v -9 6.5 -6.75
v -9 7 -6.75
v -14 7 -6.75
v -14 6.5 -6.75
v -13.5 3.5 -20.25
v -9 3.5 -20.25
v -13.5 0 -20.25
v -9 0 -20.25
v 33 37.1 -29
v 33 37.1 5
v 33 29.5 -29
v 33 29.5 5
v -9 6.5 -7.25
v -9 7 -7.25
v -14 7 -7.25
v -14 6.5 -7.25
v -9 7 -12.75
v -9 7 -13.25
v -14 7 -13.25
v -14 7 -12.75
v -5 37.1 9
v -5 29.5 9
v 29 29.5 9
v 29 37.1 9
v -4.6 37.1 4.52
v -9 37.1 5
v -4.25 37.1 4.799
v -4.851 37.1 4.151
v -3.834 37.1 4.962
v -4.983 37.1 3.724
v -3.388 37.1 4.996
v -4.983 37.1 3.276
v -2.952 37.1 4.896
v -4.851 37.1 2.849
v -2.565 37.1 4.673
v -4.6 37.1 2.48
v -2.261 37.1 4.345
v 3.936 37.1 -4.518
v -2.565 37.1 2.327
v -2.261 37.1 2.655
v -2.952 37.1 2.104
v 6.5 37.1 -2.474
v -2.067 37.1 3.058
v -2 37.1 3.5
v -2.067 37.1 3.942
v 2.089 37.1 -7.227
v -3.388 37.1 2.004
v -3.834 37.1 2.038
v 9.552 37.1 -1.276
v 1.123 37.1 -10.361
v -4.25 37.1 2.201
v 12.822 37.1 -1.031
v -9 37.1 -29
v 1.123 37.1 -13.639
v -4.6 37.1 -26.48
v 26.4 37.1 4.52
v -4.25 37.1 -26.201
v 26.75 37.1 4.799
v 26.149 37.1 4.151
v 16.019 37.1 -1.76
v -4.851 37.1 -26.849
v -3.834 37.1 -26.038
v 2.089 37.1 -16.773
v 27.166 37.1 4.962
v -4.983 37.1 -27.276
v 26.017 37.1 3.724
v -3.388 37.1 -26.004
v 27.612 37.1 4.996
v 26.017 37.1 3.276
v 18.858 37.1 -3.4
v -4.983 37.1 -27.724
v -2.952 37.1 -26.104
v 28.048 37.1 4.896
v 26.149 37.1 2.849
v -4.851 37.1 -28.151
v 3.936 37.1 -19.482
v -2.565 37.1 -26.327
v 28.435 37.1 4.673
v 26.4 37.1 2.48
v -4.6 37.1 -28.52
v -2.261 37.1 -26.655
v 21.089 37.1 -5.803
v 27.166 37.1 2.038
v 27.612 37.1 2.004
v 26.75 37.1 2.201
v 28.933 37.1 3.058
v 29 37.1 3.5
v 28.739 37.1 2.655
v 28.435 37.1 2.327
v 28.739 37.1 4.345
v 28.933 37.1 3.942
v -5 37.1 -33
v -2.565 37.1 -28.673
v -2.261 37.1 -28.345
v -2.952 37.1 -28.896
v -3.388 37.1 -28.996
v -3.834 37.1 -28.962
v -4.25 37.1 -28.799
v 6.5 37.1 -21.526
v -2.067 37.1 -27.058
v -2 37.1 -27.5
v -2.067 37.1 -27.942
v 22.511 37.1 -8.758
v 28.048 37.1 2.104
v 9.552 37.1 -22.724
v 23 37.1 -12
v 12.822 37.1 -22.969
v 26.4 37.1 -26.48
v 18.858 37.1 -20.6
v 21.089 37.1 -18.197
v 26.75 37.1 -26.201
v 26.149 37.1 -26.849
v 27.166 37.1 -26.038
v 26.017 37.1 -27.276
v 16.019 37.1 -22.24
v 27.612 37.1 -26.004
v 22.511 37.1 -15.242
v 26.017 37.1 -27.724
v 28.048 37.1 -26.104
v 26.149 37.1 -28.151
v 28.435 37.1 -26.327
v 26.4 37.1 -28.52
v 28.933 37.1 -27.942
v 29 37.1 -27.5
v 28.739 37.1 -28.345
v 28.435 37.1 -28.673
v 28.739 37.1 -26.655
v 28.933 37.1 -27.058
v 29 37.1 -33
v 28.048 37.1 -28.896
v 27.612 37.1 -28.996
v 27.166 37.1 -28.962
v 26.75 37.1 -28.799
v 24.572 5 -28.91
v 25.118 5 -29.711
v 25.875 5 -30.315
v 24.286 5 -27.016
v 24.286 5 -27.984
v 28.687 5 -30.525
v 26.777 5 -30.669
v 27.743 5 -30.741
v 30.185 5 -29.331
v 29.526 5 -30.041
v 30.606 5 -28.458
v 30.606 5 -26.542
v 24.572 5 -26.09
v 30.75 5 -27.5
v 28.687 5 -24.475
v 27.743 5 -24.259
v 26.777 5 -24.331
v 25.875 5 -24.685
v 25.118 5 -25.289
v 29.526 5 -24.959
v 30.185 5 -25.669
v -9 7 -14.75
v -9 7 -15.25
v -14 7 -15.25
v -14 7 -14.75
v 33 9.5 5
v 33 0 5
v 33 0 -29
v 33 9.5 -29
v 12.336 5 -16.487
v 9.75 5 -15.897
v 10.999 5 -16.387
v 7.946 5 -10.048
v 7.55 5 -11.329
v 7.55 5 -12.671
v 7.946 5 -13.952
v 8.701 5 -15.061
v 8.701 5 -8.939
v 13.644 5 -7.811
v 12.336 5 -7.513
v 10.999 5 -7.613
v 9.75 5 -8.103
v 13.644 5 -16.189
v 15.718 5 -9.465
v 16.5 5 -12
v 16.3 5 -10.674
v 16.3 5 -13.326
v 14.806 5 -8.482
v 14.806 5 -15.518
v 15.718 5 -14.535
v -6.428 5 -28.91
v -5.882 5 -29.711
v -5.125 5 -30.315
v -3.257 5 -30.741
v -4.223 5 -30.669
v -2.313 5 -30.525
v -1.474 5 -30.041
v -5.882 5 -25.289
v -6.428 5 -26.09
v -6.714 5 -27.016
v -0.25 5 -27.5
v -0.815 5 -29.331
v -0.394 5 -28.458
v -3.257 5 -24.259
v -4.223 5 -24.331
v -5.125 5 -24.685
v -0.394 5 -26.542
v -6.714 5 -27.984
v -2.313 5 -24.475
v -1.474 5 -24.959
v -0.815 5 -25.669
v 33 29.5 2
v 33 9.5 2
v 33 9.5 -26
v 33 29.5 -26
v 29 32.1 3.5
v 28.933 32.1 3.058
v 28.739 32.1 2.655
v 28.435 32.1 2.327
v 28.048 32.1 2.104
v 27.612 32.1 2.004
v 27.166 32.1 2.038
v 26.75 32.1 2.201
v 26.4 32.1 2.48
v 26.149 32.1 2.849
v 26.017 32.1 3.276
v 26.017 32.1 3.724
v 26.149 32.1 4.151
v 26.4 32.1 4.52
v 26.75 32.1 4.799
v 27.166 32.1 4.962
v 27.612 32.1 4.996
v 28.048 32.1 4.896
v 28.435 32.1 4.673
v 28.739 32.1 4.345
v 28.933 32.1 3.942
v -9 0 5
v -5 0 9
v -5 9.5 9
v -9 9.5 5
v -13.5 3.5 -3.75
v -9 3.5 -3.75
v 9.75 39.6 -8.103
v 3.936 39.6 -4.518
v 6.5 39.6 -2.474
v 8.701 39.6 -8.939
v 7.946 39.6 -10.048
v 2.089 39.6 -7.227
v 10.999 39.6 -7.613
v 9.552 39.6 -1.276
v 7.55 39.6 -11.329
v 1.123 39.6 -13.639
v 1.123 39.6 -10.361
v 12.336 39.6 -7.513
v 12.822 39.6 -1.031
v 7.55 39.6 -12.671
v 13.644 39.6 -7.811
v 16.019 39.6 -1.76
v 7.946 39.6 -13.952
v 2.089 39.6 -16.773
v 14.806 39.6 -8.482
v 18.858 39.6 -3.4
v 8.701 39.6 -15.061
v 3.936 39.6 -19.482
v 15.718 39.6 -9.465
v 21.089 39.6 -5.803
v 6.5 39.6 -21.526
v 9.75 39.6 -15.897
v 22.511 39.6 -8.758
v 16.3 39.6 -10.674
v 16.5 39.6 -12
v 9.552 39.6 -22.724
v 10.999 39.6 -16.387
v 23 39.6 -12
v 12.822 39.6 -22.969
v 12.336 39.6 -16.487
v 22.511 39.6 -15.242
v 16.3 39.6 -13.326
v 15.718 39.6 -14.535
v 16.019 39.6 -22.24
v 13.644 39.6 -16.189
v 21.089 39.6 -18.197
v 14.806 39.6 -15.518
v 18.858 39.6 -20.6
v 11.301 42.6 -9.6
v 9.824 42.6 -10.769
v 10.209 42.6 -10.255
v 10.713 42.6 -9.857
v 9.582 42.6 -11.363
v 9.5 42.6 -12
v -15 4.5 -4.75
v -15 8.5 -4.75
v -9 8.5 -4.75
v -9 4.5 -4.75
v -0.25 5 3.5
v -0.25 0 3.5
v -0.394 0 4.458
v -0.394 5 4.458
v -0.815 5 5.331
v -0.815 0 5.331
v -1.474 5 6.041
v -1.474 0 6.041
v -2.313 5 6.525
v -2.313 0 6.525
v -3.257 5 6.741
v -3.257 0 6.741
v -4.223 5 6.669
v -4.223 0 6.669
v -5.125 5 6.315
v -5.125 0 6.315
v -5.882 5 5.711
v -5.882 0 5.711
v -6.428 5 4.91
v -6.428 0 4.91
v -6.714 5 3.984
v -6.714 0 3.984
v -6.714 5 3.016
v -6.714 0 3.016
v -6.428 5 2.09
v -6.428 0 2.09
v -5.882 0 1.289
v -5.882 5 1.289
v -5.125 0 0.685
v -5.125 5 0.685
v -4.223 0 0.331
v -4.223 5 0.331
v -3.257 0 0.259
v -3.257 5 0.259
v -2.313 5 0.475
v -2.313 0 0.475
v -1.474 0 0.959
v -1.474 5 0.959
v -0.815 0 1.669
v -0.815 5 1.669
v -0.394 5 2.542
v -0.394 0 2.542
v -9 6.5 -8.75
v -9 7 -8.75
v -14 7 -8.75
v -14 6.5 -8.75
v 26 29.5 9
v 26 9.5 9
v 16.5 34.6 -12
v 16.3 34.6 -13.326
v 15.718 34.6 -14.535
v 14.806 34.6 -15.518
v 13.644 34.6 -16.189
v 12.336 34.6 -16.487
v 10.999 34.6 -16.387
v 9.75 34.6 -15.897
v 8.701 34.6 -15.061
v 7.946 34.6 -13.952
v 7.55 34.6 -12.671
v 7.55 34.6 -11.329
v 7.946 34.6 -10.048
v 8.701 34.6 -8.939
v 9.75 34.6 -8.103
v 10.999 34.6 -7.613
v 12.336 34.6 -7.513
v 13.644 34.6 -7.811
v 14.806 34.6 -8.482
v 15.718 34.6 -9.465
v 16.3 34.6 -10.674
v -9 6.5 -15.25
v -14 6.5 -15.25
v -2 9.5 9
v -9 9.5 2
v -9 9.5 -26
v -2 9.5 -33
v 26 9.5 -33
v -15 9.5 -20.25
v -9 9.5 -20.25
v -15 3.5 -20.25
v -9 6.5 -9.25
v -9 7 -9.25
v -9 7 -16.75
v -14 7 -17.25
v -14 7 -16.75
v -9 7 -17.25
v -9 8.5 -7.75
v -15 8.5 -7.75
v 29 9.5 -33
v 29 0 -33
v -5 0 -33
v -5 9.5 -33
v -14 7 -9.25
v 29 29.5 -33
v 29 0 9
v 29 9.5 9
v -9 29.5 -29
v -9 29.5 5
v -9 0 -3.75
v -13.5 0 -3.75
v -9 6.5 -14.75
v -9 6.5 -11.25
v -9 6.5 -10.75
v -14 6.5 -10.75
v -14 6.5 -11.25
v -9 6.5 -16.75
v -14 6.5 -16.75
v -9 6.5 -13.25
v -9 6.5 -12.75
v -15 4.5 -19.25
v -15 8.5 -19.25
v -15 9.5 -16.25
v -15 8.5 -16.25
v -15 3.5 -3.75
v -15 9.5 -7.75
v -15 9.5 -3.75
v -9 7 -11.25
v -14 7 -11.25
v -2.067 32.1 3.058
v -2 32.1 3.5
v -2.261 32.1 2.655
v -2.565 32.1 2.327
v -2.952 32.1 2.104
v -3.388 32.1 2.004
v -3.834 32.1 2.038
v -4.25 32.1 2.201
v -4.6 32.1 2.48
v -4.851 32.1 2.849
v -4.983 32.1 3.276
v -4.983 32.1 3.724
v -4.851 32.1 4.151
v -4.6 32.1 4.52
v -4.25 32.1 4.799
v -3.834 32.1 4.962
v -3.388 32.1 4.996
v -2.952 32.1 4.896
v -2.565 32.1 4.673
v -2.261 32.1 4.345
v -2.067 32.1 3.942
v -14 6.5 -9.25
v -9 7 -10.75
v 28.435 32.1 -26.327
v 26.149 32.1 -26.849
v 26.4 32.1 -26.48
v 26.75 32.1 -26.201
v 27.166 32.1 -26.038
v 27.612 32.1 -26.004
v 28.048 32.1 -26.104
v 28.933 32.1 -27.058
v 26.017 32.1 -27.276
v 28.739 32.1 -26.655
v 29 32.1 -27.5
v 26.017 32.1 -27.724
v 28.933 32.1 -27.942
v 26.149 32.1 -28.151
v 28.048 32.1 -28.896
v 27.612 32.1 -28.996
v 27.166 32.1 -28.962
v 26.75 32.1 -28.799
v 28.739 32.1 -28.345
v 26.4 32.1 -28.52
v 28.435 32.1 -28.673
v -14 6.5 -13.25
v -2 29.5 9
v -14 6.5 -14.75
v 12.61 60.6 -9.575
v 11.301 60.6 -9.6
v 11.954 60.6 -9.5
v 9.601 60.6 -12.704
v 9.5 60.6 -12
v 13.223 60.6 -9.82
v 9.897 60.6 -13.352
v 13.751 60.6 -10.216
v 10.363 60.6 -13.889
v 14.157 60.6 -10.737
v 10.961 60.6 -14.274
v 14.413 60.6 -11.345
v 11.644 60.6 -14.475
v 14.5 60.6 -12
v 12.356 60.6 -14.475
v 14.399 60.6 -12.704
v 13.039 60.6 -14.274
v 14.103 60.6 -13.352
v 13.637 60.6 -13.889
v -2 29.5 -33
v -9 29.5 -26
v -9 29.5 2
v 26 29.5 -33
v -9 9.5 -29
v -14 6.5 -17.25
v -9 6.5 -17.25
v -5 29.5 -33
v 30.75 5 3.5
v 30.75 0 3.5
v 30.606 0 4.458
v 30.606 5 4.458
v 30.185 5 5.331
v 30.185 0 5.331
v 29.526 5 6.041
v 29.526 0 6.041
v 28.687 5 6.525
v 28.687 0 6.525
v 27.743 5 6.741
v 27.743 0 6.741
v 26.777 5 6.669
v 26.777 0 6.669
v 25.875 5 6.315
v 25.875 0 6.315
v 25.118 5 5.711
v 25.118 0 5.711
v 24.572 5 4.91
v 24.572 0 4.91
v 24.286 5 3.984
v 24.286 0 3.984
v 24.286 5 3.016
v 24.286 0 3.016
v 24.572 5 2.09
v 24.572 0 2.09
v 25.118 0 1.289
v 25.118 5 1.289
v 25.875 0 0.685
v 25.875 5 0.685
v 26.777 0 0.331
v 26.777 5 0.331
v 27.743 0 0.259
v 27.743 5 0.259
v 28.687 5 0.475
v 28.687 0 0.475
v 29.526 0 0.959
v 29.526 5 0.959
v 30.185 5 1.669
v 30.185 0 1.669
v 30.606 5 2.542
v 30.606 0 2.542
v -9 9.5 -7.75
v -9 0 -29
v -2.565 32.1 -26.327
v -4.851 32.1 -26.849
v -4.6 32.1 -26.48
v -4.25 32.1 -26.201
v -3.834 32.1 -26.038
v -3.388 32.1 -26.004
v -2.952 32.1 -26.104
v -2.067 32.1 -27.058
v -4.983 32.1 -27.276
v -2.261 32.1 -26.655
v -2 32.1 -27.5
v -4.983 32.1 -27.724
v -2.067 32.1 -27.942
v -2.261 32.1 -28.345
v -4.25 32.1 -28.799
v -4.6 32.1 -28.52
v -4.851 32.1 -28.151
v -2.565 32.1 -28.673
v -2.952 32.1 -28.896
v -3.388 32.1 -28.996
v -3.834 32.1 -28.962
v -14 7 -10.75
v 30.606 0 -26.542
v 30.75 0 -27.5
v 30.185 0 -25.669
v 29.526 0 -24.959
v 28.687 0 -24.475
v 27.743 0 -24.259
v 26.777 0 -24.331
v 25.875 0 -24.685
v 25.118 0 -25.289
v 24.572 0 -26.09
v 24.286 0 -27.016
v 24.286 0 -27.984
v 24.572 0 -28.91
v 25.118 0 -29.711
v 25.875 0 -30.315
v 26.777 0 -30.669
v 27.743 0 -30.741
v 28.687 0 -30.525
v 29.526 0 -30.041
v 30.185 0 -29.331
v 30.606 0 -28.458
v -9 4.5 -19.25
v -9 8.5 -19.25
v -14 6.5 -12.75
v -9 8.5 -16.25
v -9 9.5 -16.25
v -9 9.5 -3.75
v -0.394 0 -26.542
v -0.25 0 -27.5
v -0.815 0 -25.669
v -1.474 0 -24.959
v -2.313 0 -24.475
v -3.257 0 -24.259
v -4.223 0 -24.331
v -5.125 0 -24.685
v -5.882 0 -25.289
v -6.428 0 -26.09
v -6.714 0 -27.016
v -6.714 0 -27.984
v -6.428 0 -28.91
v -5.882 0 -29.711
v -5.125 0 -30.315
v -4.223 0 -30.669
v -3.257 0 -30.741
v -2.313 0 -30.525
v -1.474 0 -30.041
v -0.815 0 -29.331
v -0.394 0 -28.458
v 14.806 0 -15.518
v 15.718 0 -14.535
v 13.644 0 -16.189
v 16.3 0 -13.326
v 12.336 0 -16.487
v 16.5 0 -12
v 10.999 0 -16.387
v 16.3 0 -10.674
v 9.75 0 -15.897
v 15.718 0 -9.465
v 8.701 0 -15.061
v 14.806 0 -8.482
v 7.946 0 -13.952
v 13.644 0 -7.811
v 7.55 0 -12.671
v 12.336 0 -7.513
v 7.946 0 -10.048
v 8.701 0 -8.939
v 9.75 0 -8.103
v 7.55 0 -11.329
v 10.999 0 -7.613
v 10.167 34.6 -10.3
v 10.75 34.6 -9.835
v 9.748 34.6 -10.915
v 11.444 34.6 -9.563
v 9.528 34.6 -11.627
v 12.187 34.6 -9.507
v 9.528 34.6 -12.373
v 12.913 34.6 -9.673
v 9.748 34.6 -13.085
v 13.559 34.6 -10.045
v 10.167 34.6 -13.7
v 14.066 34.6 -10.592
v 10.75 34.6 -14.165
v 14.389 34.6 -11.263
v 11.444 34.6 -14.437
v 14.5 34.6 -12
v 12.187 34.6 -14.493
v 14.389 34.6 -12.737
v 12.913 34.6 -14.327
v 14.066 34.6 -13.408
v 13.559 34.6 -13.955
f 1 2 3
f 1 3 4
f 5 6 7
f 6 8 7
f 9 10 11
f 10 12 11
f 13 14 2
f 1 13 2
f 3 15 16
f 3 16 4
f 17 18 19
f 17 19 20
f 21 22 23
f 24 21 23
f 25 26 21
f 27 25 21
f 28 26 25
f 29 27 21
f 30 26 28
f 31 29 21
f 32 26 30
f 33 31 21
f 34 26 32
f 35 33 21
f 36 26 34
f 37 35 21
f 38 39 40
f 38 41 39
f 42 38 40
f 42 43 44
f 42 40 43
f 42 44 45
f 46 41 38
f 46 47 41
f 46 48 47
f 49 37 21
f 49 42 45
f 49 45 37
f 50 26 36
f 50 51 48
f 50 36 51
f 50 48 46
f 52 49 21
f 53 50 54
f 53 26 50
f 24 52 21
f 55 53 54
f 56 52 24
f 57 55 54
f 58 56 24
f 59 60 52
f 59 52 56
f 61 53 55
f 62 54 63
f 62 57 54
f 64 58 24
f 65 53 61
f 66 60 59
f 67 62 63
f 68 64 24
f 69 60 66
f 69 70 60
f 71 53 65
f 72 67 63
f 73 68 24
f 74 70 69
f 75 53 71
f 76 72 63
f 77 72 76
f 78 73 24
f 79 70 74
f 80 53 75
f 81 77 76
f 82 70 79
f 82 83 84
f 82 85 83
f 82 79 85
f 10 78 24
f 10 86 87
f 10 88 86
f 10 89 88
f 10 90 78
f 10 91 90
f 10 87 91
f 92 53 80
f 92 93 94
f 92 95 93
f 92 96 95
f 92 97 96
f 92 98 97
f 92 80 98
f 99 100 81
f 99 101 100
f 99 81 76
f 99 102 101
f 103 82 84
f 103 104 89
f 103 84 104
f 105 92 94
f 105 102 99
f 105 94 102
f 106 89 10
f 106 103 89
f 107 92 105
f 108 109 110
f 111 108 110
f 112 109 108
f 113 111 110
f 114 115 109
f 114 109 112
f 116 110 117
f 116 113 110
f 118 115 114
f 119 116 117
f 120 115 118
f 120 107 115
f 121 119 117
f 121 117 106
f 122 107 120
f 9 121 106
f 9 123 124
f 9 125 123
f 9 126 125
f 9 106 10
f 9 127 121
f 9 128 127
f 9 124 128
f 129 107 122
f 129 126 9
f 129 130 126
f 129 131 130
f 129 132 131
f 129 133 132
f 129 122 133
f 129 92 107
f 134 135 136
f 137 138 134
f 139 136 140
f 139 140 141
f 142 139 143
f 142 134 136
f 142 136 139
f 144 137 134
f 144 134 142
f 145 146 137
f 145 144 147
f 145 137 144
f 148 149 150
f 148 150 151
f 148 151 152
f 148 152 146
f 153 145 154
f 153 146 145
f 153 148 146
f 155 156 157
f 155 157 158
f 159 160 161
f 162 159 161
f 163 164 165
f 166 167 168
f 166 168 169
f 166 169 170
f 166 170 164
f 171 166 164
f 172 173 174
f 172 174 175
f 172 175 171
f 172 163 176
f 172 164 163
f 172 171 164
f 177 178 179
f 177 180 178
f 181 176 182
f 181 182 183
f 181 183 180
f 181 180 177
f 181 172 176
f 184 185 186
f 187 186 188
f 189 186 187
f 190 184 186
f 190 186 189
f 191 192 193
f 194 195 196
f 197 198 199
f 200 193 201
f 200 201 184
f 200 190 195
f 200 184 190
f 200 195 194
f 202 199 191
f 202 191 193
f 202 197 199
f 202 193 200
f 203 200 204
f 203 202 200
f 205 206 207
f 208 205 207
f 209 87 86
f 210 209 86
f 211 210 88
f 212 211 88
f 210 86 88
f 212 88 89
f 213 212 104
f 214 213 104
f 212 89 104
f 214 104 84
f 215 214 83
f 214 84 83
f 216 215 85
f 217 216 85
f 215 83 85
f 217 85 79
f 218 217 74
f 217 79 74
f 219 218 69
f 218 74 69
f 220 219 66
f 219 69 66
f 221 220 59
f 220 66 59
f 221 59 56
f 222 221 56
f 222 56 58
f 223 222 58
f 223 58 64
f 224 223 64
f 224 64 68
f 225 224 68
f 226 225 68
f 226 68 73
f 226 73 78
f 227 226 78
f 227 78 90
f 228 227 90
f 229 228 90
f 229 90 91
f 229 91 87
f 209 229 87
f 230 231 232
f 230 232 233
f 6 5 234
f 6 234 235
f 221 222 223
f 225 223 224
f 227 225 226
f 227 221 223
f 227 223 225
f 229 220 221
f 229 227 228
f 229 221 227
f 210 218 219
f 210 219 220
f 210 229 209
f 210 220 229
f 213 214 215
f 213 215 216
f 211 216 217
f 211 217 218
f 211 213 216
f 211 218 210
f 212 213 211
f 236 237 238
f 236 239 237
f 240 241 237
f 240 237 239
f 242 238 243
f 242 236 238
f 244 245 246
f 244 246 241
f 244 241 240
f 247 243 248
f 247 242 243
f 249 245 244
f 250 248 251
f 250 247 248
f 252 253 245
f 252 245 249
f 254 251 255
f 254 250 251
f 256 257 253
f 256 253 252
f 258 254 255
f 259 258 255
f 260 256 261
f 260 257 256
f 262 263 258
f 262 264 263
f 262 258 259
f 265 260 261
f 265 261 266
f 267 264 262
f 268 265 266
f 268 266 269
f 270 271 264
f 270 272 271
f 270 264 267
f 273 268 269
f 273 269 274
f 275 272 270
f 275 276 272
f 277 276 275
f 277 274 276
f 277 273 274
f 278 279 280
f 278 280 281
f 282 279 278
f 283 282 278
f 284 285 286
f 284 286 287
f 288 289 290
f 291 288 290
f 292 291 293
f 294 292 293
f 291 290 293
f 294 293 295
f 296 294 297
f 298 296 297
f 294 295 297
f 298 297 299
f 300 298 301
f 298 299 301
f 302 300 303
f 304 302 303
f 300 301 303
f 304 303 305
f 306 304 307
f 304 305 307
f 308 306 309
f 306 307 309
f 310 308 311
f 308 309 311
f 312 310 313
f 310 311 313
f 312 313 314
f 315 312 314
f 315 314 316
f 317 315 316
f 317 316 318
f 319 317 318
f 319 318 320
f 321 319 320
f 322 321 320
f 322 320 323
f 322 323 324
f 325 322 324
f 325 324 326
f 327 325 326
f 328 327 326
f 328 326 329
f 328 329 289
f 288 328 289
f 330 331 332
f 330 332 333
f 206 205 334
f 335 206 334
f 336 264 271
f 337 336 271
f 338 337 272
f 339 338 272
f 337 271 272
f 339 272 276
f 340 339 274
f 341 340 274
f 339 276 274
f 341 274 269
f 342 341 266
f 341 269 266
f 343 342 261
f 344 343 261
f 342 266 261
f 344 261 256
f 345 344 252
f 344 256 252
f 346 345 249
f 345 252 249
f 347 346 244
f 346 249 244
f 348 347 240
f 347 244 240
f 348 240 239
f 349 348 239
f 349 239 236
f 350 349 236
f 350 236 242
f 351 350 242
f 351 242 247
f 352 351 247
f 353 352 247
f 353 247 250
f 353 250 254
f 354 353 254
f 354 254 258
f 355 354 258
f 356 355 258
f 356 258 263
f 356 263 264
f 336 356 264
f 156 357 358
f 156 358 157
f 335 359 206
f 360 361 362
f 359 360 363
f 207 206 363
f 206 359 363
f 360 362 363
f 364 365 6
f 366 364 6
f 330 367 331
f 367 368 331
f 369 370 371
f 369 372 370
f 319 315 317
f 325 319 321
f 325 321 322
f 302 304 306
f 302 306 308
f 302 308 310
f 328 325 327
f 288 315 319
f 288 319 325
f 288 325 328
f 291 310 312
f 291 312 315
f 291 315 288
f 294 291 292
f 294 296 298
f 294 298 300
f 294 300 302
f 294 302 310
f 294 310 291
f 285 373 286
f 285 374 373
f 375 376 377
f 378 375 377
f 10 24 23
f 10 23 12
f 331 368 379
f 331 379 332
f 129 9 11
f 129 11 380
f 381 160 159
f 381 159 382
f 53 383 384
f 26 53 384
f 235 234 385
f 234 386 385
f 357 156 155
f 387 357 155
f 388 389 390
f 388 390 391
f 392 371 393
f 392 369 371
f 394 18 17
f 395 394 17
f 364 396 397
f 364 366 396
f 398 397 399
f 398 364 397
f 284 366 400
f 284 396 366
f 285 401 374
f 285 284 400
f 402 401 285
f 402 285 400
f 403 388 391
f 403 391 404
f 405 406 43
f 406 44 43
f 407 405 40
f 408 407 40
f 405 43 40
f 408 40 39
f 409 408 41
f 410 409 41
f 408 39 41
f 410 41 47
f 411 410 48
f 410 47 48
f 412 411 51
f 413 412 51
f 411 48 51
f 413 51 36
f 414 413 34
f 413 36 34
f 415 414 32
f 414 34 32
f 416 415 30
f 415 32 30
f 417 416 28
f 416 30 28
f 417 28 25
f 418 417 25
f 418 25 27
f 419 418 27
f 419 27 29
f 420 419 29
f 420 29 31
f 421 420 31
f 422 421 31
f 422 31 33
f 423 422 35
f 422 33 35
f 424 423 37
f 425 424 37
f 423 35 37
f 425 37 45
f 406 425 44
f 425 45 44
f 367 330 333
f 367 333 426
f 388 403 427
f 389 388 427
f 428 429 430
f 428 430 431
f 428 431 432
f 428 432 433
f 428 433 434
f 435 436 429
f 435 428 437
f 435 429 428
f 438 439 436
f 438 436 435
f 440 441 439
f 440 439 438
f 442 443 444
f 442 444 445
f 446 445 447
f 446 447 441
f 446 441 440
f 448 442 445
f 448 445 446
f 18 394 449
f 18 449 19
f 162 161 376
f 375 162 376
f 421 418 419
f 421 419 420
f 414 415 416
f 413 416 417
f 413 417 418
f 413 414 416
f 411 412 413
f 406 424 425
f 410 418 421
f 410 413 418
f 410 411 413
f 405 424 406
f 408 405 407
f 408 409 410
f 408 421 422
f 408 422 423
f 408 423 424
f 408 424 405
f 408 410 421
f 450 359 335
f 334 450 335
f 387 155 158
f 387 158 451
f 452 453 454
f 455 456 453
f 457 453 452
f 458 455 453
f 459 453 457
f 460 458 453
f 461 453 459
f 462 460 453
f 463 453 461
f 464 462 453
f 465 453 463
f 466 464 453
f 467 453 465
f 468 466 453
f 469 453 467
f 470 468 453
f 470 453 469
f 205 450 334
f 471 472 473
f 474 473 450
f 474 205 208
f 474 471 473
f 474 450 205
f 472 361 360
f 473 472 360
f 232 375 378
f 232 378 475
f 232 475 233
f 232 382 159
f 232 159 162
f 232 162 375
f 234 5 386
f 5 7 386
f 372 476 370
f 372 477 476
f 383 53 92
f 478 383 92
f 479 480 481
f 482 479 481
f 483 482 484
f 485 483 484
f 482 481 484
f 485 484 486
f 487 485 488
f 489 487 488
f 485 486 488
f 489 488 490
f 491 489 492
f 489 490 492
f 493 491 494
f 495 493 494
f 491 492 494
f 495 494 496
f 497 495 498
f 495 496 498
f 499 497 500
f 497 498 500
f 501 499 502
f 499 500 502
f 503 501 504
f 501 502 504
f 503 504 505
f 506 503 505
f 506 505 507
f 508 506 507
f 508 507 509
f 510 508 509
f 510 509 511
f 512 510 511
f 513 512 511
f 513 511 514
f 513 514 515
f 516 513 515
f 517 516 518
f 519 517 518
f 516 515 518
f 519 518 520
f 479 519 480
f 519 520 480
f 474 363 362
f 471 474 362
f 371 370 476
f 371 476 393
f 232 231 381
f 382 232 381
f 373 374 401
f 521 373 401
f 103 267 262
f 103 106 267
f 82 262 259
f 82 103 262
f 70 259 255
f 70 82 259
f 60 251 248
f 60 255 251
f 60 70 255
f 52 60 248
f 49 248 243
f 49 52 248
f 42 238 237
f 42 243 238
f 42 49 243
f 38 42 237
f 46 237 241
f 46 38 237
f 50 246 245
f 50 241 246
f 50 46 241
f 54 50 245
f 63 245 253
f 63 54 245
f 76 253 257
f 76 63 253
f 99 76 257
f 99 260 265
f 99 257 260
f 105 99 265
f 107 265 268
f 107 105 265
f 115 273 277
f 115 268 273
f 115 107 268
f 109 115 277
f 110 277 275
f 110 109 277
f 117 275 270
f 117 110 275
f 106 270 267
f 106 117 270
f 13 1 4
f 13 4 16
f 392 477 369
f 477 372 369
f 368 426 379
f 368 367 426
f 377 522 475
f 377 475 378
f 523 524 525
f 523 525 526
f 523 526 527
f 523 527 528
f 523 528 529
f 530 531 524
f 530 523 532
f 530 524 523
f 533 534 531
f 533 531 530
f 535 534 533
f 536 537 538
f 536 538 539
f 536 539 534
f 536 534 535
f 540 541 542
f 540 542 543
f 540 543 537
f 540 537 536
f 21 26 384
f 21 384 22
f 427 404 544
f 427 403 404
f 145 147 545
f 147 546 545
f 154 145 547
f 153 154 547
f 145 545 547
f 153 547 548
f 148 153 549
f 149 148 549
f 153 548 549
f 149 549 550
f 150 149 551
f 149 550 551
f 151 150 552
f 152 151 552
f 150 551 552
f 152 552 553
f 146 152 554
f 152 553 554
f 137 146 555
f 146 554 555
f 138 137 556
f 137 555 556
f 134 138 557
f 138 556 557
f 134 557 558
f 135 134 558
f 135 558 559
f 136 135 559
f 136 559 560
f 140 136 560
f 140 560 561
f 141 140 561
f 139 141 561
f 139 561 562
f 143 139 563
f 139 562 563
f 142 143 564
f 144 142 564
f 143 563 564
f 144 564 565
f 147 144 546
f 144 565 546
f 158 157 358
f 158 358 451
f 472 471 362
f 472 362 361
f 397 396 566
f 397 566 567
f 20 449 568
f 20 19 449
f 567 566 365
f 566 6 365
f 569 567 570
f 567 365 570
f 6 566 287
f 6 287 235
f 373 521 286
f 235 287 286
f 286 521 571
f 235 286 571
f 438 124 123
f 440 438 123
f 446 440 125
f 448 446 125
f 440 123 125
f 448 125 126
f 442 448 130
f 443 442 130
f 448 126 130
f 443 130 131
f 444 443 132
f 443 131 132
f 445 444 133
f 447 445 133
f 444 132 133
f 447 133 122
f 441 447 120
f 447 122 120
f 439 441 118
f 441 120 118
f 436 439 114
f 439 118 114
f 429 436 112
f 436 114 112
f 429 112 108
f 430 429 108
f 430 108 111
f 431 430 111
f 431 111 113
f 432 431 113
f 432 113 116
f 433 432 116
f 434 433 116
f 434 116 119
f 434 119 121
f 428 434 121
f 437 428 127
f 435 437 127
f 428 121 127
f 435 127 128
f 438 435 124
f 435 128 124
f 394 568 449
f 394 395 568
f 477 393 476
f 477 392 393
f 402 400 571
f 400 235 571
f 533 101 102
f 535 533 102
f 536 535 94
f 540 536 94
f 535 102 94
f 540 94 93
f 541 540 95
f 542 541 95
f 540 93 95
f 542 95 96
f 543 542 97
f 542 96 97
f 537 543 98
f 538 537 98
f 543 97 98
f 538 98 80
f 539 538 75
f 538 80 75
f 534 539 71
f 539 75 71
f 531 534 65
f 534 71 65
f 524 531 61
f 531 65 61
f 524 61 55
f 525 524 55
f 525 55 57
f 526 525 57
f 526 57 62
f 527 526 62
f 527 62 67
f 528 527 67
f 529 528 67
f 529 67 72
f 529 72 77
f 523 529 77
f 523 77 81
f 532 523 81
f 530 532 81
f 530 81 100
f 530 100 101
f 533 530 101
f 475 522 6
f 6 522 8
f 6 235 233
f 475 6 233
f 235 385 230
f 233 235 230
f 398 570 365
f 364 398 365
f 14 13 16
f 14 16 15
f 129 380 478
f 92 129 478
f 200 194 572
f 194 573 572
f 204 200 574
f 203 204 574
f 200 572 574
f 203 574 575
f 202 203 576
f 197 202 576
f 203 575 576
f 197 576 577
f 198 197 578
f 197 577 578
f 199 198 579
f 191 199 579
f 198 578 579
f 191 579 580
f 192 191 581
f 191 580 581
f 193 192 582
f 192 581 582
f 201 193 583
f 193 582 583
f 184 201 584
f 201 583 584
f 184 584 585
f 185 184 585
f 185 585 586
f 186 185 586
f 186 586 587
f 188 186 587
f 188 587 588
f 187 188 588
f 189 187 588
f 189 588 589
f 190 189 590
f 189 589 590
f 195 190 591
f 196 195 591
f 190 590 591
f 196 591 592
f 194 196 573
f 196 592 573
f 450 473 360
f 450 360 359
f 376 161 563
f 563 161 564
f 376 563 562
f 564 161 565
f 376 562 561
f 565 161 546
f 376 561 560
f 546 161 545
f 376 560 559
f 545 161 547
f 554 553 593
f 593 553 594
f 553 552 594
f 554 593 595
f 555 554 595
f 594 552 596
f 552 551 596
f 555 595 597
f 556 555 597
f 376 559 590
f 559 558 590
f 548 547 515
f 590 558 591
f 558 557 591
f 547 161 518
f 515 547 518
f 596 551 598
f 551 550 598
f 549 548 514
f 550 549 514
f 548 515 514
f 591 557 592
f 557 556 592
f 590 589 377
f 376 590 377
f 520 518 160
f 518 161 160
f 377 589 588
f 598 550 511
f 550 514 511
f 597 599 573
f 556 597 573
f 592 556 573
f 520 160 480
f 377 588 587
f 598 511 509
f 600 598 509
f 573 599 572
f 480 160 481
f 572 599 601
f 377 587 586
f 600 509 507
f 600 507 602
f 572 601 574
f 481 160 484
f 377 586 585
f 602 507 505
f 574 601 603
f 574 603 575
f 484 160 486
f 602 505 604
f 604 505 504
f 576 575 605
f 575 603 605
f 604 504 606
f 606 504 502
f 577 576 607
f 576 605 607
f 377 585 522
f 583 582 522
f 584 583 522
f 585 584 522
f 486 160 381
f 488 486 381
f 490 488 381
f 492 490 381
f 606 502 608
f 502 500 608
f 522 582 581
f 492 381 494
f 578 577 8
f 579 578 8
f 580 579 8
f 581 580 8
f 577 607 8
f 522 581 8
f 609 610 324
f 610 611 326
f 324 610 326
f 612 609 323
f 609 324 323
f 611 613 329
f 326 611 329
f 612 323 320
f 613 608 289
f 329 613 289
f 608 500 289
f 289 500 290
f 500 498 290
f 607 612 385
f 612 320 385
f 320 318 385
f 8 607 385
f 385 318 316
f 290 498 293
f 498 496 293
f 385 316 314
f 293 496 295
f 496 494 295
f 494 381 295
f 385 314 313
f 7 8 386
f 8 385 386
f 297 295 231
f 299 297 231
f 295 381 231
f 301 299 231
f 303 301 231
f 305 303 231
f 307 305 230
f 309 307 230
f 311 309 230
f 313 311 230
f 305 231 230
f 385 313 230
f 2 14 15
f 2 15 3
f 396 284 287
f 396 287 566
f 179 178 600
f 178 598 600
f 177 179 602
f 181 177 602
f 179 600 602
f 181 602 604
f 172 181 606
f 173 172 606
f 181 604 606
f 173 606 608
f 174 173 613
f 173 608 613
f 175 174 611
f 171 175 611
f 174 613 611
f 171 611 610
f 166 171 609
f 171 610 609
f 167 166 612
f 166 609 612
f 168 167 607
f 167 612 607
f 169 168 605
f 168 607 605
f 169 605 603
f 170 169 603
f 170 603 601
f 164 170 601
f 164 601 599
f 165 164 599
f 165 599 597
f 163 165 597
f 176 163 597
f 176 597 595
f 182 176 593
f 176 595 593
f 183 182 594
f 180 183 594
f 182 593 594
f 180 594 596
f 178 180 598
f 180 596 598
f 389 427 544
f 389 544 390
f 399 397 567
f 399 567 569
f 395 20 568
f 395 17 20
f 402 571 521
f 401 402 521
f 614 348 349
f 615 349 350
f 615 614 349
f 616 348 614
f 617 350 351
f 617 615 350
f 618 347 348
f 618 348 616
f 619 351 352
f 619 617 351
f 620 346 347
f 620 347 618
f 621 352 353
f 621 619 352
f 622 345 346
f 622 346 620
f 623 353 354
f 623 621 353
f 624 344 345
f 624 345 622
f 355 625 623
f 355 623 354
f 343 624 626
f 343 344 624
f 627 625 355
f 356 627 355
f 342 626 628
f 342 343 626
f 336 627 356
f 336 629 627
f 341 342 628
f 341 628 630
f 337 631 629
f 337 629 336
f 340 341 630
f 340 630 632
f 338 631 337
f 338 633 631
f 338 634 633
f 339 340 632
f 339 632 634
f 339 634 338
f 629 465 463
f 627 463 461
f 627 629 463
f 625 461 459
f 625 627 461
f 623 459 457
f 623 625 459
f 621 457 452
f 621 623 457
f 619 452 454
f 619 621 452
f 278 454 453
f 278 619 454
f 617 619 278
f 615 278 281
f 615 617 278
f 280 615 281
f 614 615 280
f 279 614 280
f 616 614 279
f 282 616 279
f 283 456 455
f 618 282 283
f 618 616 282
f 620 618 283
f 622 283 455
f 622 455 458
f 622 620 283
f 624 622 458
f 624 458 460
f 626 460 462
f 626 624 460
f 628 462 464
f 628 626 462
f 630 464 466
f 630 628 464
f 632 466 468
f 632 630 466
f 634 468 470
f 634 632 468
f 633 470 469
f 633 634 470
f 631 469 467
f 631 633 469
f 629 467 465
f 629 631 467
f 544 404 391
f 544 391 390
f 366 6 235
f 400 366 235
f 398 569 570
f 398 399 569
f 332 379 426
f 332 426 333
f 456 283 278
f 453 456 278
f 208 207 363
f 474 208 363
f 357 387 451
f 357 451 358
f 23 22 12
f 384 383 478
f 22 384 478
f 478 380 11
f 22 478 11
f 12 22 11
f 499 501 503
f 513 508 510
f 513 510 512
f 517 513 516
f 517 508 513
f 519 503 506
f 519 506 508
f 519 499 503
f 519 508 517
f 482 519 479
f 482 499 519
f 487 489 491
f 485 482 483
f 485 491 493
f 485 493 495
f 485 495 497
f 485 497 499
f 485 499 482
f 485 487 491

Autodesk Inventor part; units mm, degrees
ref_plane "YZ Plane" through (0, 0, 0) normal (1, 0, 0) x (0, 1, 0)
ref_plane "XZ Plane" through (0, 0, 0) normal (0, 1, 0) x (-1, 0, 0)
ref_plane "XY Plane" through (0, 0, 0) normal (0, 0, 1) x (1, 0, 0)
sketch "Эскиз1" plane through (0, 0, 0) normal (0, 1, 0) x (-1, 0, 0)
  line L0 (9, 9) -> (-33, 9)
  line L1 (-33, 9) -> (-33, -33)
  line L2 (-33, -33) -> (9, -33)
  line L3 (9, -33) -> (9, 9)
  line L4 (9, -29) -> (5, -33)
  line L5 (9, 9) -> (-33, -33) construction
  line L6 (9, -33) -> (-33, 9) construction
  line L7 (5, 9) -> (9, 5)
  line L8 (-33, 5) -> (-29, 9)
  line L9 (-33, -29) -> (-29, -33)
  line L10 (13.5, -3.75) -> (9, -3.75)
  line L11 (9, -20.25) -> (13.5, -20.25)
  line L12 (13.5, -20.25) -> (13.5, -3.75)
  point P0 (0, 0)
  dimension "d0" = 42
  dimension "d1" = 42
  dimension "d2" = 4
  dimension "d3" = 4
  dimension "d17" = 12.75
  dimension "d18" = 16.5
  dimension "d19" = 4.5
extrude "Выдавливание1" add sketch "Эскиз1" along normal blind 9.5 contours L7 L3 L4 L2 L9 L1 L8 L0 | L10 L12 L11 L3
sketch "Эскиз2" plane through (0, 0, 0) normal (0, -1, 0) x (1, 0, 0)
  line L0 (-9, -33) -> (33, -33)
  line L1 (33, -33) -> (33, 9)
  line L2 (33, 9) -> (-9, 9)
  line L3 (-9, 9) -> (-9, -33)
  line L4 (-9, -33) -> (33, 9) construction
  line L5 (33, -33) -> (-9, 9) construction
  circle A0 centre (12, -12) radius 4.5
  circle A1 centre (-3.5, -27.5) radius 3.25
  circle A2 centre (-3.5, 3.5) radius 3.25
  circle A3 centre (27.5, 3.5) radius 3.25
  circle A4 centre (27.5, -27.5) radius 3.25
  line L6 (33, 5) -> (33, -29) projected
  line L7 (-5, 9) -> (29, 9) projected
  line L8 (29, -33) -> (-5, -33) projected
  line L9 (-9, -3.75) -> (-9, 5) projected
  point P0 (0, 0)
  dimension "d22" = 9
  dimension "d23" = 6.5
  dimension "d25" = 5.5
  dimension "d28" = 360
extrude "Выдавливание2" cut sketch "Эскиз2" against normal blind 5 contours A0 | A1 | A2 | A3 | A4
sketch "Эскиз3" plane through (0, 9.5, 0) normal (0, 1, 0) x (1, 0, 0)
  line L0 (-13.5, 3.75) -> (-9, 3.75) projected
  line L1 (-13.5, 3.75) -> (-9, 3.75)
  line L2 (-9, 3.75) -> (-9, 20.25)
  line L3 (-9, 20.25) -> (-13.5, 20.25)
  line L4 (-13.5, 20.25) -> (-13.5, 3.75)
  point P0 (0, 0)
extrude "Выдавливание3" cut sketch "Эскиз3" against normal blind 6
sketch "Эскиз4" plane through (-9, 0, -29) normal (-1, 0, 0) x (0, 0, 1)
  line L0 (8.75, 3.5) -> (25.25, 3.5) projected
  line L1 (8.75, 3.5) -> (25.25, 3.5)
  line L2 (25.25, 3.5) -> (25.25, 9.5)
  line L3 (25.25, 9.5) -> (8.75, 9.5)
  line L4 (8.75, 9.5) -> (8.75, 3.5)
  point P0 (29, 0)
  dimension "d34" = 16.5
  dimension "d35" = 6
extrude "Выдавливание4" add sketch "Эскиз4" along normal blind 6 separate body
sketch "Эскиз5" plane through (-15, 0, -29) normal (-1, 0, 0) x (0, 0, 1)
  line L0 (25.25, 9.5) -> (8.75, 9.5) projected
  line L1 (25.25, 3.5) -> (8.75, 3.5) projected
  line L2 (8.75, 9.5) -> (25.25, 9.5)
  line L3 (25.25, 9.5) -> (25.25, 3.5)
  line L4 (25.25, 3.5) -> (8.75, 3.5)
  line L5 (8.75, 3.5) -> (8.75, 9.5)
  line L6 (9.75, 8.5) -> (12.75, 8.5)
  line L7 (24.25, 8.5) -> (24.25, 4.5)
  line L8 (24.25, 4.5) -> (9.75, 4.5)
  line L9 (9.75, 4.5) -> (9.75, 8.5)
  line L10 (12.75, 8.5) -> (12.75, 9.5)
  line L11 (21.25, 8.5) -> (21.25, 9.5)
  line L12 (0, 9.5) -> (34, 9.5) projected
  line L13 (21.25, 8.5) -> (24.25, 8.5)
  point P0 (29, 0)
  dimension "d38" = 1
  dimension "d39" = 4
  dimension "d40" = 4
extrude "Выдавливание5" cut sketch "Эскиз5" against normal blind 6 contours L11 L13 L7 L8 L9 L6 L10 L0 bodies 2
sketch "Эскиз6" plane through (-9, 0, -29) normal (-1, 0, 0) x (0, 0, 1)
  line L0 (11.75, 7) -> (12.25, 7)
  line L1 (12.25, 7) -> (12.25, 6.5)
  line L2 (12.25, 6.5) -> (11.75, 6.5)
  line L3 (11.75, 6.5) -> (11.75, 7)
  line L4 (13.75, 7) -> (14.25, 7)
  line L5 (14.25, 7) -> (14.25, 6.5)
  line L6 (14.25, 6.5) -> (13.75, 6.5)
  line L7 (13.75, 6.5) -> (13.75, 7)
  line L8 (15.75, 7) -> (16.25, 7)
  line L9 (16.25, 7) -> (16.25, 6.5)
  line L10 (16.25, 6.5) -> (15.75, 6.5)
  line L11 (15.75, 6.5) -> (15.75, 7)
  line L12 (17.75, 7) -> (18.25, 7)
  line L13 (18.25, 7) -> (18.25, 6.5)
  line L14 (18.25, 6.5) -> (17.75, 6.5)
  line L15 (17.75, 6.5) -> (17.75, 7)
  line L16 (19.75, 7) -> (20.25, 7)
  line L17 (20.25, 7) -> (20.25, 6.5)
  line L18 (20.25, 6.5) -> (19.75, 6.5)
  line L19 (19.75, 6.5) -> (19.75, 7)
  line L20 (21.75, 7) -> (22.25, 7)
  line L21 (22.25, 7) -> (22.25, 6.5)
  line L22 (22.25, 6.5) -> (21.75, 6.5)
  line L23 (21.75, 6.5) -> (21.75, 7)
  line L24 (8.75, 0) -> (8.75, 3.5) projected
  point P0 (29, 0)
  dimension "d43" = 0.5
  dimension "d44" = 0.5
  dimension "d47" = 2
  dimension "d52" = 3
extrude "Выдавливание6" add sketch "Эскиз6" along normal blind 5 separate body
sketch "Эскиз7" plane through (0, 9.5, 0) normal (0, 1, 0) x (1, 0, 0)
  line L0 (33, 33) -> (-9, 33)
  line L1 (-9, 33) -> (-9, -9)
  line L2 (-9, -9) -> (33, -9)
  line L3 (33, -9) -> (33, 33)
  line L4 (33, -2) -> (26, -9)
  line L5 (33, -5) -> (33, 29) projected
  line L6 (-5, -9) -> (29, -9) projected
  line L7 (-9, 29) -> (-9, -5) projected
  line L8 (-9, -2) -> (-2, -9)
  line L9 (-2, 33) -> (-9, 26)
  line L10 (33, 26) -> (26, 33)
  line L11 (29, 33) -> (-5, 33) projected
  point P0 (0, 0)
  point P1 (33, 12)
  point P2 (12, -9)
  point P3 (-2, -9)
  dimension "d56" = 7
  dimension "d57" = 42
  dimension "d58" = 42
  dimension "d59" = 7
extrude "Выдавливание7" add sketch "Эскиз7" along normal blind 20 separate body contours L10 L3 L4 L2 L8 L1 L9 L0
sketch "Эскиз8" plane through (0, 29.5, 0) normal (0, 1, 0) x (1, 0, 0)
  line L0 (33, 33) -> (-9, 33)
  line L1 (-9, 33) -> (-9, -9)
  line L2 (-9, -9) -> (33, -9)
  line L3 (33, -9) -> (33, 33)
  line L4 (33, 29) -> (29, 33)
  line L5 (29, -9) -> (33, -5)
  line L6 (-9, -5) -> (-5, -9)
  line L7 (-9, 29) -> (-5, 33)
  point P0 (0, 0)
  dimension "d62" = 42
  dimension "d63" = 42
  dimension "d64" = 4
  dimension "d65" = 4
extrude "Выдавливание8" add sketch "Эскиз8" along normal blind 7.6 contours L4 L3 L5 L2 L6 L1 L7 L0 bodies 1
sketch "Эскиз9" plane through (0, 37.1, 0) normal (0, 1, 0) x (1, 0, 0)
  line L0 (33, -9) -> (-9, -9)
  line L1 (-9, -9) -> (-9, 33)
  line L2 (-9, 33) -> (33, 33)
  line L3 (33, 33) -> (33, -9)
  line L4 (33, -9) -> (-9, 33) construction
  line L5 (-9, -9) -> (33, 33) construction
  circle A0 centre (12, 12) radius 11
  point P0 (0, 0)
  dimension "d68" = 42
  dimension "d69" = 42
  dimension "d70" = 22
extrude "Выдавливание9" add sketch "Эскиз9" along normal blind 2.5 contours A0 bodies 1
sketch "Эскиз10" plane through (12, 39.6, -12) normal (0, 1, 0) x (1, 0, 0)
  circle A0 centre (0, 0) radius 11 projected
  circle A1 centre (0, 0) radius 4.5
  point P0 (-12, -12)
  dimension "d73" = 9
extrude "Выдавливание10" cut sketch "Эскиз10" against normal blind 5 contours A1 bodies 1
sketch "Эскиз11" plane through (12, 34.6, -12) normal (0, 1, 0) x (1, 0, 0)
  circle A0 centre (0, 0) radius 4.5 projected
  circle A1 centre (0, 0) radius 2.5
  point P0 (-12, -12)
  dimension "d76" = 5
extrude "Выдавливание11" add sketch "Эскиз11" along normal blind 26 contours A1 bodies 1
sketch "Эскиз12" plane through (12, 60.6, -12) normal (0, 1, 0) x (1, 0, 0)
  circle A0 centre (0, 0) radius 2.5 projected
  line L0 (-2.5, 0) -> (-0.6992, -2.4002)
  circle A1 centre (0, 0) radius 2.5
  point P0 (-12, -12)
extrude "Выдавливание12" cut sketch "Эскиз12" against normal blind 18 contours L0 A0 picked at (-1.8806, -0.9775) bodies 1
sketch "Эскиз13" plane through (0, 37.1, 0) normal (0, 1, 0) x (1, 0, 0)
  line L0 (-9, -9) -> (33, -9)
  line L1 (33, -9) -> (33, 33)
  line L2 (33, 33) -> (-9, 33)
  line L3 (-9, 33) -> (-9, -9)
  circle A0 centre (27.5, 27.5) radius 1.5
  circle A1 centre (-3.5, -3.5) radius 1.5
  line L4 (-9, 29) -> (-9, -5) projected
  line L5 (-9, 27.5) -> (33, 27.5) construction
  line L6 (33, -5) -> (33, 29) projected
  line L7 (29, 33) -> (-5, 33) projected
  line L8 (27.5, 33) -> (27.5, -9) construction
  line L9 (-5, -9) -> (29, -9) projected
  line L10 (-9, -3.5) -> (33, -3.5) construction
  line L11 (33, -5) -> (33, 29) projected
  line L12 (-3.5, -9) -> (-3.5, 33) construction
  line L13 (29, 33) -> (-5, 33) projected
  circle A2 centre (-3.5, 27.5) radius 1.5
  circle A3 centre (27.5, -3.5) radius 1.5
  point P0 (0, 0)
  dimension "d81" = 42
  dimension "d82" = 42
  dimension "d85" = 3
  dimension "d86" = 3
  dimension "d89" = 5.5
  dimension "d90" = 5.5
  dimension "d91" = 5.5
  dimension "d92" = 5.5
  dimension "d93" = 3
  dimension "d94" = 3
extrude "Выдавливание13" cut sketch "Эскиз13" against normal blind 5 contours A0 | A1 | A2 | A3 bodies 1
equation "\"d85\" = d93"
equation "\"d86\" = d93"
equation "\"d90\" = d89"
equation "\"d91\" = d89"
equation "\"d92\" = d89"
equation "\"d94\" = d93"
properties part number "Nema-17"
